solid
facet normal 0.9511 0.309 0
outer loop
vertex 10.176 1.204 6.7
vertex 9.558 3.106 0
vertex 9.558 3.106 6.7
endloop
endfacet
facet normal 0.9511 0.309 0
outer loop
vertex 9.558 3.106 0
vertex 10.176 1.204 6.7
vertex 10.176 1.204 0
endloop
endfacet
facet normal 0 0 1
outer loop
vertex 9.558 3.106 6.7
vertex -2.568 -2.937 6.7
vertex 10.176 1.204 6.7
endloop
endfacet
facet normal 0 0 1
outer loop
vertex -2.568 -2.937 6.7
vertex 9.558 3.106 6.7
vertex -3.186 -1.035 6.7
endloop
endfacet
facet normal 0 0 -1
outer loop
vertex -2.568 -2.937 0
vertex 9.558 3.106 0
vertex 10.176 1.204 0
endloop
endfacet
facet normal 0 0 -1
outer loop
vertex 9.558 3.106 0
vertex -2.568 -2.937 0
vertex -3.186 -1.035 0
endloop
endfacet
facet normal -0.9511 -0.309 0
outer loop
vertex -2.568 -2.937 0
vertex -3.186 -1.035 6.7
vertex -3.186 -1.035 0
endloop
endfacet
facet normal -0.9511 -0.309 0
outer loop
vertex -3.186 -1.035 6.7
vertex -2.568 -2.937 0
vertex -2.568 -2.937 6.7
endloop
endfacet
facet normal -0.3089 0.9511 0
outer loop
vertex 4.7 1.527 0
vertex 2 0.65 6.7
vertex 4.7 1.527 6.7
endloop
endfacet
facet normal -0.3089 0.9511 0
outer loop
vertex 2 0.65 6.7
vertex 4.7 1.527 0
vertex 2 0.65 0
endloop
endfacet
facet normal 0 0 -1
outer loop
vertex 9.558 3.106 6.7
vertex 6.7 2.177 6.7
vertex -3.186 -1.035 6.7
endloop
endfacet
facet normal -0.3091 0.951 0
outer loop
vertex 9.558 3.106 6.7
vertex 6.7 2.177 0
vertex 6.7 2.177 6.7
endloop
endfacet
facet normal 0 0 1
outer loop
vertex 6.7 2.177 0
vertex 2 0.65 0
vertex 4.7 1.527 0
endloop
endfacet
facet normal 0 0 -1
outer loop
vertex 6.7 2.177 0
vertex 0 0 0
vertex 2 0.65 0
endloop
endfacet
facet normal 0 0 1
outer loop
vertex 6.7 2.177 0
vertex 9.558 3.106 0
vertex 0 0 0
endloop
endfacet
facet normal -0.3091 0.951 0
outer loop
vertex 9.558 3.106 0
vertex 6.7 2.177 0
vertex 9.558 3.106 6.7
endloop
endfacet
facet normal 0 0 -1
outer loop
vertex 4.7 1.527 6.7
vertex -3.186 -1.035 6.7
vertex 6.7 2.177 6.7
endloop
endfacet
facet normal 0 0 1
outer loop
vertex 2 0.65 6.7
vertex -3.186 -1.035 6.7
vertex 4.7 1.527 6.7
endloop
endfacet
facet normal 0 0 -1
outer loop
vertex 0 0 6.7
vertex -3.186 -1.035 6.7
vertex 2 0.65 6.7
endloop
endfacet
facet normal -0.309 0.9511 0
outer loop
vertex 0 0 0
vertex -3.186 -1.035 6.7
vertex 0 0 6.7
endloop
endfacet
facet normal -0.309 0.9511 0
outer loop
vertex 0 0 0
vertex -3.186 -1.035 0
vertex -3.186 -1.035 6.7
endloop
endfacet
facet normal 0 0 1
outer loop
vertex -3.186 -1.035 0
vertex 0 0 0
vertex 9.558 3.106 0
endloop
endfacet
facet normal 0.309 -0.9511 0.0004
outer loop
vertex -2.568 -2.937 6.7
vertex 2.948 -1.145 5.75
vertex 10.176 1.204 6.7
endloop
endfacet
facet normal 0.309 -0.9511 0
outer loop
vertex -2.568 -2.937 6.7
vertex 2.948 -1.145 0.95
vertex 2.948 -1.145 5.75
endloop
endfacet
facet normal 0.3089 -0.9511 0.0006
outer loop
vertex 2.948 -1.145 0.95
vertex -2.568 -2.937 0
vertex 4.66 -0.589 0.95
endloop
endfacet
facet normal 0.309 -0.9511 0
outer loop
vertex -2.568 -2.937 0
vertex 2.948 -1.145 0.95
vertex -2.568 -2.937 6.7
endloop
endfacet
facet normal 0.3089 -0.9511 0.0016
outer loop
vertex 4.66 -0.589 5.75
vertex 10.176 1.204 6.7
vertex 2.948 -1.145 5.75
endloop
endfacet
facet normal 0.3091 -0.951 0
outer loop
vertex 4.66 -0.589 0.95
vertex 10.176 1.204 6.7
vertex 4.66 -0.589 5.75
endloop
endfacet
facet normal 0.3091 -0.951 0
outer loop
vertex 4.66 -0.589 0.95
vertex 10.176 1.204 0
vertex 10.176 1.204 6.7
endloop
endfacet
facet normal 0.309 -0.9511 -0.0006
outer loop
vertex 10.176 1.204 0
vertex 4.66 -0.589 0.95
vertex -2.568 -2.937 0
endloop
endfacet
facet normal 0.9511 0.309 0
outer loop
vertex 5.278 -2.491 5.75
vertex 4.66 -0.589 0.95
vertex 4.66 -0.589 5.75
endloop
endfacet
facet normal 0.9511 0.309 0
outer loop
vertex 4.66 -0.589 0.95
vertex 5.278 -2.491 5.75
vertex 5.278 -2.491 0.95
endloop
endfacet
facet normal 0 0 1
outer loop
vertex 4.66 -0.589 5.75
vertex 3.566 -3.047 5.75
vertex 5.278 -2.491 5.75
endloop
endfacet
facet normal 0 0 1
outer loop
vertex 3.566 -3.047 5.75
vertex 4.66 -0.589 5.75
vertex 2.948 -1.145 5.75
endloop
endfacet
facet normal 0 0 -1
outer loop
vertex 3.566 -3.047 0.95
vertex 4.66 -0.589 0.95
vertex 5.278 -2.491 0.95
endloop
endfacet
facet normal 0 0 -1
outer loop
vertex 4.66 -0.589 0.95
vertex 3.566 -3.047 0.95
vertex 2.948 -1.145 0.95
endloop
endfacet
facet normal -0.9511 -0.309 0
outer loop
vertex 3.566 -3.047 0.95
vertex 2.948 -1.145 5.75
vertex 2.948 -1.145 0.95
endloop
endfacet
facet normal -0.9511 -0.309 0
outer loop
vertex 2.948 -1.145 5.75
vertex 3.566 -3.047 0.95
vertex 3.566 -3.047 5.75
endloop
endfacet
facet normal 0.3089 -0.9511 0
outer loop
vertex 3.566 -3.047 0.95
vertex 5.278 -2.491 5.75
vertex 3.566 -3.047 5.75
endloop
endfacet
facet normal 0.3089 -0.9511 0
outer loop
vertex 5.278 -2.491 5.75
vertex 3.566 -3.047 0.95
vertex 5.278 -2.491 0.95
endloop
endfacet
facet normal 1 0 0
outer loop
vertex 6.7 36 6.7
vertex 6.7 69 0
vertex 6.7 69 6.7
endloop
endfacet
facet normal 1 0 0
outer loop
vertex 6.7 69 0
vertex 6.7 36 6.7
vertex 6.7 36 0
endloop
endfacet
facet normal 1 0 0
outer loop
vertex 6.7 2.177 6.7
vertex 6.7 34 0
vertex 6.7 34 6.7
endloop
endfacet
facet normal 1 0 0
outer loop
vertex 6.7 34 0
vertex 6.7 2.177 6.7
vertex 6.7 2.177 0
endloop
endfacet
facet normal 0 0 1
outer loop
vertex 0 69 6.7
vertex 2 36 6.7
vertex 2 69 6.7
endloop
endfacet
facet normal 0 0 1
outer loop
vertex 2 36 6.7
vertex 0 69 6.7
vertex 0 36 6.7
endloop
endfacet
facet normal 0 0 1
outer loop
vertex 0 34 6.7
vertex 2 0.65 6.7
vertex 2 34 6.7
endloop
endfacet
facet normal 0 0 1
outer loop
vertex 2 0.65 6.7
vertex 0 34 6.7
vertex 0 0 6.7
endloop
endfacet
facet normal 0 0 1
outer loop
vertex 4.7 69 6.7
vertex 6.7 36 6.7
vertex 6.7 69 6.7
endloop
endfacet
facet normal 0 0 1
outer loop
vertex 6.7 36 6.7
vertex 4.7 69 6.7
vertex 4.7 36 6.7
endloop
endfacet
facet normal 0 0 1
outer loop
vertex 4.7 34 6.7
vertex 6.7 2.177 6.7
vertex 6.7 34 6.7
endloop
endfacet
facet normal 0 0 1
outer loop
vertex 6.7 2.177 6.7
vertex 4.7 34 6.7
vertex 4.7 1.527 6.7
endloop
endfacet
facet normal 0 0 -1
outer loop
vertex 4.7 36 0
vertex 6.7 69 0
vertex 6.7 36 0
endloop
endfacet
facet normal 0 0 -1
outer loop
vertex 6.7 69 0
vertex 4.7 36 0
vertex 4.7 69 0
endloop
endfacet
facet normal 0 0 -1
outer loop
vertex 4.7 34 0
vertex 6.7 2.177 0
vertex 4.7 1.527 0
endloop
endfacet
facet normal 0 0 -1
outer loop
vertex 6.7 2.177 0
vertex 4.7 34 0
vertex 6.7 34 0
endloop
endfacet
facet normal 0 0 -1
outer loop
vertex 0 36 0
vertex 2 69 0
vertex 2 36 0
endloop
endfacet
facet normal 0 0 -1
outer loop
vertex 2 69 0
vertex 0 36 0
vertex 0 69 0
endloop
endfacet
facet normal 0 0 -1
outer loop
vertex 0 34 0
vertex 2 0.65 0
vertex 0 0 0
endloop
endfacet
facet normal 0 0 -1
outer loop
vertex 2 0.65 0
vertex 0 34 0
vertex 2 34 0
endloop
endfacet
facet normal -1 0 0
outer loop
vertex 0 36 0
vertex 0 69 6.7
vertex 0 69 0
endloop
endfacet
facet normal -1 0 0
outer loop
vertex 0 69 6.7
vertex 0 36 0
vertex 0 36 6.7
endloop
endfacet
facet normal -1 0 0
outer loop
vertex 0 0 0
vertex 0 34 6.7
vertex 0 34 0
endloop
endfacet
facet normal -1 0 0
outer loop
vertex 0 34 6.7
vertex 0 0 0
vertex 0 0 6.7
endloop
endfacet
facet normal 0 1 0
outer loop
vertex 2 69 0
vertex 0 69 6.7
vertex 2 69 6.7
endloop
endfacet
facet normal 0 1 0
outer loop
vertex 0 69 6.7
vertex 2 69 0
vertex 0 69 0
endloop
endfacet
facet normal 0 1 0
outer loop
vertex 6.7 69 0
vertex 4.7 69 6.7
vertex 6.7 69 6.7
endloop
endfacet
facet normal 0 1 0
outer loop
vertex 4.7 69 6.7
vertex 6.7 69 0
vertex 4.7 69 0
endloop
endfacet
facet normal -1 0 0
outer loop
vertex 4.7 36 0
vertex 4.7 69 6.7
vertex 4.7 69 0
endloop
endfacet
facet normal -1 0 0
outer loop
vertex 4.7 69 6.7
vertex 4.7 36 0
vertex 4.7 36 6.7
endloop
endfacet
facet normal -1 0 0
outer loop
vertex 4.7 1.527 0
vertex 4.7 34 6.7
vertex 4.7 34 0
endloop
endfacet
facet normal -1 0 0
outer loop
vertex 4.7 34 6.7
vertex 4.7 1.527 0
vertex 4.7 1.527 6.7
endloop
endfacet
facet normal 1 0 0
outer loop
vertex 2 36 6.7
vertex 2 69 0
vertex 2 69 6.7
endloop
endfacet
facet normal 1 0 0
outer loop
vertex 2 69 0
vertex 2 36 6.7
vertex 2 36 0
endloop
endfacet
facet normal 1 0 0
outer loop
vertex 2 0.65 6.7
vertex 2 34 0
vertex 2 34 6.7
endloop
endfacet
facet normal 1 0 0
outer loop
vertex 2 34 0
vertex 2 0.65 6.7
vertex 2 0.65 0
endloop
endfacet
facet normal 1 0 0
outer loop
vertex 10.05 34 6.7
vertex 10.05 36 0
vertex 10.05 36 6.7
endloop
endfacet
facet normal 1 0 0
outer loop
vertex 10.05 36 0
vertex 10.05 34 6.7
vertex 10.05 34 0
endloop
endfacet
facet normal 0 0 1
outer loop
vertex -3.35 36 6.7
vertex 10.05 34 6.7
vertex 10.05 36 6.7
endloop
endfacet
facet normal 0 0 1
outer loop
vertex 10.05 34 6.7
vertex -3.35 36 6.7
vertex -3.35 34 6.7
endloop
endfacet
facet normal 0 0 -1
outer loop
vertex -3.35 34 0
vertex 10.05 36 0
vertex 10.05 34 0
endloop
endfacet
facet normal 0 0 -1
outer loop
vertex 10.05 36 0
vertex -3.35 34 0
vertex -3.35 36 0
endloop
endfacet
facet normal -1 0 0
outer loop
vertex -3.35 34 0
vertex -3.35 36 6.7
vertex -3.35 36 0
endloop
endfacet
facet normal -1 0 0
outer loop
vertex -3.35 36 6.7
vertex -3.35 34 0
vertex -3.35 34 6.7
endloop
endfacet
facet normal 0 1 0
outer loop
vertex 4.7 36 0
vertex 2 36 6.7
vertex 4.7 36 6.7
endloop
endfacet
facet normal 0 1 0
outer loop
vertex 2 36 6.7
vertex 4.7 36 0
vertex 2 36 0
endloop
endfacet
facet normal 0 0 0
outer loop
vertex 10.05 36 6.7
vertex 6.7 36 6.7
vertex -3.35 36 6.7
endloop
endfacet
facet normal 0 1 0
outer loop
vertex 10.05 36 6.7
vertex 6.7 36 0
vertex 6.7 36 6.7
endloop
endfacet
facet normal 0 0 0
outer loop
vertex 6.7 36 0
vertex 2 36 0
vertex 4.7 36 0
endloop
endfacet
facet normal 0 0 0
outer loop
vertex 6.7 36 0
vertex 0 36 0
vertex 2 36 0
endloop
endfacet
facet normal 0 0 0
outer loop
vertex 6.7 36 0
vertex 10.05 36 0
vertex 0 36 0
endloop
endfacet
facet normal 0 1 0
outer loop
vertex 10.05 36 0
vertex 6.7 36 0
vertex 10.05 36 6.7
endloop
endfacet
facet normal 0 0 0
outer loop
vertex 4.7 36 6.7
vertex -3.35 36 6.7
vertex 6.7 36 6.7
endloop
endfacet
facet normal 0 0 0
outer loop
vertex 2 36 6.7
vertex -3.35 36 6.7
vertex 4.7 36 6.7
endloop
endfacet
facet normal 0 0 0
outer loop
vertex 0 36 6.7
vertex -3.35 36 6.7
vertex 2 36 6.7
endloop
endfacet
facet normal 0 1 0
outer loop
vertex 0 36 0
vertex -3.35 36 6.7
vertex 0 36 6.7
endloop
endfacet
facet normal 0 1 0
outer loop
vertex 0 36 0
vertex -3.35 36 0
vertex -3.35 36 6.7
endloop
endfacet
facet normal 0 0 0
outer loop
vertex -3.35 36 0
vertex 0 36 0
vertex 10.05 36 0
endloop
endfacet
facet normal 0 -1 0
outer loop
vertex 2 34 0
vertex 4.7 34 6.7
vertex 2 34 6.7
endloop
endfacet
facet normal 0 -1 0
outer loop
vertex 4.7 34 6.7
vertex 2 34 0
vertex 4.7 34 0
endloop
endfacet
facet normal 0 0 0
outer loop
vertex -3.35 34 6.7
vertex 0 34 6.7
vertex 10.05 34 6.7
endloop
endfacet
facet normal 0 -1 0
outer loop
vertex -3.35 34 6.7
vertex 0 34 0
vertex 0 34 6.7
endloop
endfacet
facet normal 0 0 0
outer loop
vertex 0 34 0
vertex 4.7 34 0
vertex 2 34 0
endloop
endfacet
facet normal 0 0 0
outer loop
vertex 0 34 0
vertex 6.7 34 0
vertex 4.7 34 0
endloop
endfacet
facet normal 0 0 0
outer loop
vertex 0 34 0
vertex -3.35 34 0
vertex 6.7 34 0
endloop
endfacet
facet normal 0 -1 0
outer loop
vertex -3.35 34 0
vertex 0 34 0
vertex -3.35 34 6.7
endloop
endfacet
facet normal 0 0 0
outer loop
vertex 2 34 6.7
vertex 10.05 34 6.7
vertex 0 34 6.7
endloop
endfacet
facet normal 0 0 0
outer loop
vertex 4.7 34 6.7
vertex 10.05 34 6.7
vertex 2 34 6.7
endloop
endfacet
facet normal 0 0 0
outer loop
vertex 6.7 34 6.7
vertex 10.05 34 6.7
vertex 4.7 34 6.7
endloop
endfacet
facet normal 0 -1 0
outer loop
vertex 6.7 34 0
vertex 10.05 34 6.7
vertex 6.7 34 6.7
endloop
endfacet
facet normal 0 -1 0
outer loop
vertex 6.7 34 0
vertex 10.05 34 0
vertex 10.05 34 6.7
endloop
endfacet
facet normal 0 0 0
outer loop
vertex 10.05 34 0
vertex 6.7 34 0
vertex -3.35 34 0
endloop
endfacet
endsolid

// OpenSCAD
width = 6.7;
length = 69.0;
thickness = 6.7;

insideHold= 35;

left = 2;

holderAngle = 18;
union() {
    
    
    rotate([0,0,holderAngle]) union() {
        translate([thickness * -0.5,-2,0]) cube([thickness*2,2, width]);
        translate([(thickness-1.8)/2,-4,(width -4.8)/2]) cube([1.8, 2,4.8]);
    }
    translate([thickness * -0.5,length-insideHold,0]) cube([thickness*2,2, width]);
    intersection() {
        rotate([0,0,holderAngle]) cube([thickness*5, length * 2, width]);
        translate([thickness/2,length/2,width/2]) difference() {
            cube([thickness, length, width], true);
            cube([thickness-left-left, length, width], true);
        };
    }
}
